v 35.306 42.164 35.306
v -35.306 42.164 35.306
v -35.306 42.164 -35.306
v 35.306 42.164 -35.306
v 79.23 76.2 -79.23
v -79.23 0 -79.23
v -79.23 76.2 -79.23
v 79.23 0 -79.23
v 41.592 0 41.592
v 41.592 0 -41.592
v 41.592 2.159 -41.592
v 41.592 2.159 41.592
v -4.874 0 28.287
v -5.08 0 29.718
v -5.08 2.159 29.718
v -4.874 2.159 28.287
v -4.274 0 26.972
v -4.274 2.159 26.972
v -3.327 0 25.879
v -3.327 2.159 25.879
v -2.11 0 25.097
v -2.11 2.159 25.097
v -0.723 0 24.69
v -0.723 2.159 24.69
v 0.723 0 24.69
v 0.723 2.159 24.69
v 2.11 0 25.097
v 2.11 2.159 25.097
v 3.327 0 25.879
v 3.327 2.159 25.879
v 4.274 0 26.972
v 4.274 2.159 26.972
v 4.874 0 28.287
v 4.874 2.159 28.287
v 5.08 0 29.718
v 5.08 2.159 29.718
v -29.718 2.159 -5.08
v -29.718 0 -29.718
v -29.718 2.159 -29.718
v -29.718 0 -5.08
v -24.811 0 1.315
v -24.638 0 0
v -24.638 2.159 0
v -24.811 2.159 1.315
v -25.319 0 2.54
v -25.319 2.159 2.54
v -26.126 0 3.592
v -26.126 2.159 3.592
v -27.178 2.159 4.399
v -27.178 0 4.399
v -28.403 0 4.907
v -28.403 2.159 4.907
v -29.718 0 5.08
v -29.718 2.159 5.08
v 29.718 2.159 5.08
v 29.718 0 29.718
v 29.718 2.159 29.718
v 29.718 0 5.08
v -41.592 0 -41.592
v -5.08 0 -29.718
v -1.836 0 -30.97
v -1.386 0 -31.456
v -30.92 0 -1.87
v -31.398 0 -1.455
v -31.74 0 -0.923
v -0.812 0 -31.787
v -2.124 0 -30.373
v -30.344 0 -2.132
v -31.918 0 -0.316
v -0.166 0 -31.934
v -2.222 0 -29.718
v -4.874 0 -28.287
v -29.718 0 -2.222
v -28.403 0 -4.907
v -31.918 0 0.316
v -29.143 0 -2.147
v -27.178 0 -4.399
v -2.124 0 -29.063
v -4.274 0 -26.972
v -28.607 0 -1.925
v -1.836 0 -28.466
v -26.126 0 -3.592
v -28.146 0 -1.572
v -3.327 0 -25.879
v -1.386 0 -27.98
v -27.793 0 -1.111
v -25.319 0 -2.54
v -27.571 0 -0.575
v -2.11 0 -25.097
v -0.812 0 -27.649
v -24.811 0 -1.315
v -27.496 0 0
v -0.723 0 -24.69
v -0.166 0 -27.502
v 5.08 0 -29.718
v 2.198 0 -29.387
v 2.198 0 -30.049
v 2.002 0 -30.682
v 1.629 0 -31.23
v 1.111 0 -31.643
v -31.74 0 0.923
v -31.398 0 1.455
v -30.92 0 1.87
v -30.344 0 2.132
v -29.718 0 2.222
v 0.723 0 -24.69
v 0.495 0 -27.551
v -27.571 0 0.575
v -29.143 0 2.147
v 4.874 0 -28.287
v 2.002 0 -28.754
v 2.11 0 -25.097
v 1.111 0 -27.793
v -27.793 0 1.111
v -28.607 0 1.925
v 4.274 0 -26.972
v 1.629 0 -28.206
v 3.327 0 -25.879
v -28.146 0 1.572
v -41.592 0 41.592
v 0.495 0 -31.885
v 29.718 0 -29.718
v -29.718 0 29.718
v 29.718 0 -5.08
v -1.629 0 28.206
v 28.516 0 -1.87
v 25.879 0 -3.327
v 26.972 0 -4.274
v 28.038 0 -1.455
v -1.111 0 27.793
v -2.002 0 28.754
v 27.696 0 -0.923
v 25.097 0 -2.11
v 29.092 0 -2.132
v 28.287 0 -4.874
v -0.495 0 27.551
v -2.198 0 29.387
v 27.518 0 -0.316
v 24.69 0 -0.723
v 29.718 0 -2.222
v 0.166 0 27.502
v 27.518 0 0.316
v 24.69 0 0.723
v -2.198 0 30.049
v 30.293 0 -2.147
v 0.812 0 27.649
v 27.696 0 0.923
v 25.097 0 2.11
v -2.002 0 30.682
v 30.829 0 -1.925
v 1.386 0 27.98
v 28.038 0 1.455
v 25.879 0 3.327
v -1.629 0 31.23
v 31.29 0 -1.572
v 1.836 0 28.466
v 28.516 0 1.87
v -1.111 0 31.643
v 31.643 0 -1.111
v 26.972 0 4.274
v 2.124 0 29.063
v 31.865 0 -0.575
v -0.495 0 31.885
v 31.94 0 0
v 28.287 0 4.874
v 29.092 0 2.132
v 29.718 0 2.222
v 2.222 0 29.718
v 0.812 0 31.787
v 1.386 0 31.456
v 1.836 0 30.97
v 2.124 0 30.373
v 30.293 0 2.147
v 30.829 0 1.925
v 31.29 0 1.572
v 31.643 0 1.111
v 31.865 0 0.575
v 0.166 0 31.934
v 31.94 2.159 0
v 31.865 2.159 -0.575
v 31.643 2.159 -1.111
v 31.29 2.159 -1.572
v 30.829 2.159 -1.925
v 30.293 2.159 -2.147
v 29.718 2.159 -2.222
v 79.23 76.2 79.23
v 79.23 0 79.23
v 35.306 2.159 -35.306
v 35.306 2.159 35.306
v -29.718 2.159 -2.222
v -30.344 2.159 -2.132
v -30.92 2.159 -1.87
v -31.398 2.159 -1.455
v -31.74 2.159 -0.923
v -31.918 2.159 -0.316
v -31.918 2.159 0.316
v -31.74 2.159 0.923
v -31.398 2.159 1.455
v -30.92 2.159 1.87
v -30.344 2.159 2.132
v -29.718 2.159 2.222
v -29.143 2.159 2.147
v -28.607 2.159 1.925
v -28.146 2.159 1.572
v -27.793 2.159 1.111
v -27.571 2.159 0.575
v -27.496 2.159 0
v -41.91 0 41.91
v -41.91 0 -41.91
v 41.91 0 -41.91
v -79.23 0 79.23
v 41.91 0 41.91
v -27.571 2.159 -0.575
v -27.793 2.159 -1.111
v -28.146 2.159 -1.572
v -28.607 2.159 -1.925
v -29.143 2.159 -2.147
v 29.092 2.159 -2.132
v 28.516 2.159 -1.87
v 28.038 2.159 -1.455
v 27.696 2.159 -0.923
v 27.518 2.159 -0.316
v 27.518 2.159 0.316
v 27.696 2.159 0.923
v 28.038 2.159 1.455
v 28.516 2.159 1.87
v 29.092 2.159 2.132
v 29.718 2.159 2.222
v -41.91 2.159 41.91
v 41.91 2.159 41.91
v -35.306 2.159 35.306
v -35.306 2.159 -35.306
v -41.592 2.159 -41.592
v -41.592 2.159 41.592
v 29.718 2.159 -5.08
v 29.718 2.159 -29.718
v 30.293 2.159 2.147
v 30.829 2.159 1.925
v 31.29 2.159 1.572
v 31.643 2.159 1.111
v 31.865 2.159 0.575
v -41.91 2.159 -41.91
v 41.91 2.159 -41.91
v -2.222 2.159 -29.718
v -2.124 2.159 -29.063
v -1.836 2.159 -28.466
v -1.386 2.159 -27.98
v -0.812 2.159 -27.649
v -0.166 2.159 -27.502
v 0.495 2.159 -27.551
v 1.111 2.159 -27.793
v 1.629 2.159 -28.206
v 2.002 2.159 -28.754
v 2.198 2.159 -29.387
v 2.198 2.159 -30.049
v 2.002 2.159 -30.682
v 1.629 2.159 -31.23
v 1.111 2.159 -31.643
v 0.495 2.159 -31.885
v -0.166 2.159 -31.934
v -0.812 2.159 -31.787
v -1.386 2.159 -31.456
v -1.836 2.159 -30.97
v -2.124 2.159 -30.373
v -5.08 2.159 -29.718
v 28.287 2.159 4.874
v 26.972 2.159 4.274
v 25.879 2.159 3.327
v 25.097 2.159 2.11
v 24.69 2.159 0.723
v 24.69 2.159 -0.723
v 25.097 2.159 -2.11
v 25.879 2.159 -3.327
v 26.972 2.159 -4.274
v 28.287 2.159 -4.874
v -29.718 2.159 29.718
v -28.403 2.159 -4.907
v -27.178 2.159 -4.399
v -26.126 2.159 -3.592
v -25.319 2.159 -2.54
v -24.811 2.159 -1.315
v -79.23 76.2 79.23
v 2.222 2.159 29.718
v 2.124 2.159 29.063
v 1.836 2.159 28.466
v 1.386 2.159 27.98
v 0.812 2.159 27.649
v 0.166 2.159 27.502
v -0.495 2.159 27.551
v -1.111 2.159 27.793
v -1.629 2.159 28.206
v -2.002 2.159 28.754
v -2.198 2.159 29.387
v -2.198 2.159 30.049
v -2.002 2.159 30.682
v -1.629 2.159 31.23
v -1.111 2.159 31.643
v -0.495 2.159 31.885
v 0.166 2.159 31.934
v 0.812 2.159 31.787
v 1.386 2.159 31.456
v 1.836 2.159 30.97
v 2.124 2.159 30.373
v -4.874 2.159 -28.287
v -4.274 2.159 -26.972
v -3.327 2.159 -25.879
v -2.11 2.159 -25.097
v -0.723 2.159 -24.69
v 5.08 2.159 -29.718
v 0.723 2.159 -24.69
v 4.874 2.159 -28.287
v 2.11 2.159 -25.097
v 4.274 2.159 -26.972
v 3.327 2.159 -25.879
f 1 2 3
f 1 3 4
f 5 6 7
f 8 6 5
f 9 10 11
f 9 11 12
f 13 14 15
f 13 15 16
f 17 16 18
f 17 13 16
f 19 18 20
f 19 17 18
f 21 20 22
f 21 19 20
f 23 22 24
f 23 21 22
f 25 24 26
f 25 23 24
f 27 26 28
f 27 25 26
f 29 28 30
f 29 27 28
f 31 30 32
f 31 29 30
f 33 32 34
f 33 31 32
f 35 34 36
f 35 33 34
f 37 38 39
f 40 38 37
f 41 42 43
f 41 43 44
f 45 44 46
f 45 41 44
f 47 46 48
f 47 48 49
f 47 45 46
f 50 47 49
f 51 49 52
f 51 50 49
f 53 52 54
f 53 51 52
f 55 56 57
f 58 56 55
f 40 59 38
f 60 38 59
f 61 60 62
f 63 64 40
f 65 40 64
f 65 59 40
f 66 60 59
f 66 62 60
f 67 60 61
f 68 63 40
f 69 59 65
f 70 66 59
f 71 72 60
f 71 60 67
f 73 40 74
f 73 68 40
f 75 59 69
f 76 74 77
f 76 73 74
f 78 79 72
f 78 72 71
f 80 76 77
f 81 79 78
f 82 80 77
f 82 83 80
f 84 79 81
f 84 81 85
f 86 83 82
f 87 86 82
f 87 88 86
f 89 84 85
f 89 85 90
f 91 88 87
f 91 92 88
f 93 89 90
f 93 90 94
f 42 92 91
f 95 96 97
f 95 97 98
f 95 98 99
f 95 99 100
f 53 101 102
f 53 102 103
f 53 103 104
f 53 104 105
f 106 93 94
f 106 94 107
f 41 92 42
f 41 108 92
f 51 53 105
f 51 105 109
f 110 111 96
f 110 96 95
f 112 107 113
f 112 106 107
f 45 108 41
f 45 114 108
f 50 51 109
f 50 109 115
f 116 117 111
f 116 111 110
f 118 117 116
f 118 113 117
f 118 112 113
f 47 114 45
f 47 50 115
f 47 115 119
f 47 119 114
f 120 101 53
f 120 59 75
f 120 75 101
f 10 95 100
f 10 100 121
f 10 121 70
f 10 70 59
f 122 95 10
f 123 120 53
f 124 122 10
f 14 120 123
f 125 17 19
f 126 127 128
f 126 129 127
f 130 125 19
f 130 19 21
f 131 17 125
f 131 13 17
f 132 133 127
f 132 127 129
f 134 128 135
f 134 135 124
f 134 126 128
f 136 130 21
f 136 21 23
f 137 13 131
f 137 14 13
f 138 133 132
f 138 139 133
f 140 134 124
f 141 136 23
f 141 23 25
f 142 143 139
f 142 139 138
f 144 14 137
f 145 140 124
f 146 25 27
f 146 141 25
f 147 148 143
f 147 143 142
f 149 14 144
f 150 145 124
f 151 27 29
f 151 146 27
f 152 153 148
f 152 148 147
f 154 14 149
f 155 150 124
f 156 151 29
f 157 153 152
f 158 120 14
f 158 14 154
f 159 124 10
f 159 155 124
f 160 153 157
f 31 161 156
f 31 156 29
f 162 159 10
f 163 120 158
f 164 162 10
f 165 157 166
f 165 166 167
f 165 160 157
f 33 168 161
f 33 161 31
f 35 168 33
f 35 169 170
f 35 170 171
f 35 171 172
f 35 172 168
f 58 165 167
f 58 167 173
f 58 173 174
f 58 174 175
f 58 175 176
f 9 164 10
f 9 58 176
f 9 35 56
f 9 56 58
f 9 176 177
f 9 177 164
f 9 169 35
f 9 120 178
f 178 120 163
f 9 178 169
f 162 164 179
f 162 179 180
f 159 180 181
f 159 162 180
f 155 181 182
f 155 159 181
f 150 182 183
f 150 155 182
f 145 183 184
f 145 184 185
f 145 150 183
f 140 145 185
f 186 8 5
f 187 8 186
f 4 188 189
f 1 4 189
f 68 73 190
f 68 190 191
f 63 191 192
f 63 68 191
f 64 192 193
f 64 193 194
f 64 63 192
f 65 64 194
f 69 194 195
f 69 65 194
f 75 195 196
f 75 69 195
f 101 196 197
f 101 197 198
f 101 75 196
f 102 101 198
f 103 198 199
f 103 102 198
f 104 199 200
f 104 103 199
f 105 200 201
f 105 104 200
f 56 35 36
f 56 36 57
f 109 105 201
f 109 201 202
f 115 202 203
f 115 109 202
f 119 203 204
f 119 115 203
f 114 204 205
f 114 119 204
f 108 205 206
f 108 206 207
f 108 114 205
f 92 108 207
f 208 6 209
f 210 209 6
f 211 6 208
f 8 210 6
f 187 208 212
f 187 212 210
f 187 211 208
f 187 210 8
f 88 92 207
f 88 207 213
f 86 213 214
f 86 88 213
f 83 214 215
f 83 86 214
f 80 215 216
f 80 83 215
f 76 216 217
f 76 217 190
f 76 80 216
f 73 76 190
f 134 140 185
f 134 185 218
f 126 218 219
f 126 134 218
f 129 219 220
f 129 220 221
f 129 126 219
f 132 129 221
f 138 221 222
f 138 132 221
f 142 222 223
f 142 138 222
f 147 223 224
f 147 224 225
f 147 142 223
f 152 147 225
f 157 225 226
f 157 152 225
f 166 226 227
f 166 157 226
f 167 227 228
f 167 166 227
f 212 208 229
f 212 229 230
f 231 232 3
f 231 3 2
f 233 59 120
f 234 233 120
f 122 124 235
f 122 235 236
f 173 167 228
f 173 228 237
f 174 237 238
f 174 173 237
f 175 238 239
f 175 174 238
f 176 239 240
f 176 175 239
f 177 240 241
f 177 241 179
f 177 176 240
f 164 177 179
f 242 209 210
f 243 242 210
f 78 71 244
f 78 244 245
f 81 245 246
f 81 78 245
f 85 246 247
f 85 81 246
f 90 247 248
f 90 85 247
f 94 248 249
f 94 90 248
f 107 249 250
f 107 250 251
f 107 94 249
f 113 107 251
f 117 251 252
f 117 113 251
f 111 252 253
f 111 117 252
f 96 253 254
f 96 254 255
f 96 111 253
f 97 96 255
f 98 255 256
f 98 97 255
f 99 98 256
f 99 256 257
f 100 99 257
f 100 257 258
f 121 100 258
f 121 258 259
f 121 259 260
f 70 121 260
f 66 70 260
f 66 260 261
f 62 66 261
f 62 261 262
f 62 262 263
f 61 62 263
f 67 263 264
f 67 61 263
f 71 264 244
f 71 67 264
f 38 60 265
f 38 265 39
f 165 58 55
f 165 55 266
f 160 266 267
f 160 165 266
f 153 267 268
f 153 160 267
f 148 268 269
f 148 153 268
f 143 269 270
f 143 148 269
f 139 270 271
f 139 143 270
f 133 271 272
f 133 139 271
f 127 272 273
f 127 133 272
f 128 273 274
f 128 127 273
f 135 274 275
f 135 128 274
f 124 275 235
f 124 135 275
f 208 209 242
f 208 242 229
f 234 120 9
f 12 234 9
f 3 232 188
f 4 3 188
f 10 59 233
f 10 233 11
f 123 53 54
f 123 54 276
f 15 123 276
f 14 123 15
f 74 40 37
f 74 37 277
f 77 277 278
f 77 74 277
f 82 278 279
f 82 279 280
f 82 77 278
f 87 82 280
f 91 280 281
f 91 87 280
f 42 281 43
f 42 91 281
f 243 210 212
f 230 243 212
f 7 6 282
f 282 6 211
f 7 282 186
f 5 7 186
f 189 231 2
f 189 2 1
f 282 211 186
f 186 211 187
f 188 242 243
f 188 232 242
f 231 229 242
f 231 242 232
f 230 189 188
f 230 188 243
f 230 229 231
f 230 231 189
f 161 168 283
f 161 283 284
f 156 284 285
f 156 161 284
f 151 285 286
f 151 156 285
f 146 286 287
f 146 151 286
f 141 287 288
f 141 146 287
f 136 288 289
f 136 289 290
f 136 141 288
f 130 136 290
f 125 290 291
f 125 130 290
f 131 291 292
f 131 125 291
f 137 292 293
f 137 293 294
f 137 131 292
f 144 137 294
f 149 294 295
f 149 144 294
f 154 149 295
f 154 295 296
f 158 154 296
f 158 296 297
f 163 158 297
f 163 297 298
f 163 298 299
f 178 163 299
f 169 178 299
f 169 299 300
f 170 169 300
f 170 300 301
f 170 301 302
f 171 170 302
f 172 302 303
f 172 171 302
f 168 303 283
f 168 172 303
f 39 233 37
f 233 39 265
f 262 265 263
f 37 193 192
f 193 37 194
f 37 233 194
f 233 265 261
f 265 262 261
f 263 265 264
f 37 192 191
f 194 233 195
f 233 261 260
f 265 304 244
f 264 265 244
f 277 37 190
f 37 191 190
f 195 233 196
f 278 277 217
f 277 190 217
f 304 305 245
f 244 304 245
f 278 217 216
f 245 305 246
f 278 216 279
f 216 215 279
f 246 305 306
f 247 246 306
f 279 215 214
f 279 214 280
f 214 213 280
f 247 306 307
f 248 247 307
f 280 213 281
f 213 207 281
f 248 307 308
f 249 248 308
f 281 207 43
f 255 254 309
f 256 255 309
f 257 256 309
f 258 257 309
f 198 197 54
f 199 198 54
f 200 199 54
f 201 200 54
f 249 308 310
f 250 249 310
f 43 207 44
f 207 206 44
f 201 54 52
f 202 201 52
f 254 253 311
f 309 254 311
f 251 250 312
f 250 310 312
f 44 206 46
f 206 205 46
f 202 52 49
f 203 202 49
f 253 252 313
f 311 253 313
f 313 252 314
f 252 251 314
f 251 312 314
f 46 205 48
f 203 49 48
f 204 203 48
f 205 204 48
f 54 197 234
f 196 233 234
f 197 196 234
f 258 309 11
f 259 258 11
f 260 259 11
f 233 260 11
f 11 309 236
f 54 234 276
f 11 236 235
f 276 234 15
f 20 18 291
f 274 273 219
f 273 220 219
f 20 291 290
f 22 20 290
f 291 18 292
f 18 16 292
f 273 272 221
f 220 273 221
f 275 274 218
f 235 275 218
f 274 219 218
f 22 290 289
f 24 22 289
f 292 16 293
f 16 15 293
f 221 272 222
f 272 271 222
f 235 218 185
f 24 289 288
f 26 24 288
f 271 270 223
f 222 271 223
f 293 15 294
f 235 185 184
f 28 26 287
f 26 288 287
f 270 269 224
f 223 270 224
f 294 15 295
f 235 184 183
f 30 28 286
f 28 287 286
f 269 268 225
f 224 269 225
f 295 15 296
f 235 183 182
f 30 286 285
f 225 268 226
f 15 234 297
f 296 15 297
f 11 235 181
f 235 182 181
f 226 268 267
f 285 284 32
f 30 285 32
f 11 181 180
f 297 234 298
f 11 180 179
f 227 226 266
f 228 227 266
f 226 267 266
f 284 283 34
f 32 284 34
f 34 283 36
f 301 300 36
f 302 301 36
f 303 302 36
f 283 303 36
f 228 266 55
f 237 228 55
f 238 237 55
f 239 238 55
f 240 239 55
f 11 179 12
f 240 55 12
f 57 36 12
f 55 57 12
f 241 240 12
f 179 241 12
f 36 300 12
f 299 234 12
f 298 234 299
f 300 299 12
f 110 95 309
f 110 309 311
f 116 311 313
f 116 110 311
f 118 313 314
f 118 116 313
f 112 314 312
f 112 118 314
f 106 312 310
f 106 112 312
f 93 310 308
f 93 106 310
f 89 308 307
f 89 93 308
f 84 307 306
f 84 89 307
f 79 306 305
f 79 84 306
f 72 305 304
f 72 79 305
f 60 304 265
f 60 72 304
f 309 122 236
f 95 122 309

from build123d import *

# Parameters (mm, degrees)
F1_W     = 83.185
F1_H     = 83.185
F1_W_2   = 70.612
F1_H_2   = 70.612
F2_DEPTH = 2.159
F0_W     = 158.4607362747
F0_H     = 158.4607362747
F0_W_2   = 83.82
F0_H_2   = 83.82
F0_W_3   = 70.612
F0_H_3   = 70.612
F3_DEPTH = 76.2
F4_DEPTH = 2.159
F5_DEPTH = 42.164


with BuildPart() as f2:
    # F1 (on face) → F2 (new body)
    with BuildSketch(Plane.XZ):
        Rectangle(F1_W, F1_H)
        Rectangle(F1_W_2, F1_H_2, mode=Mode.SUBTRACT)
        Rectangle(F1_W_2, F1_H_2)
        with BuildLine():
            Line((5.08, 29.718), (29.718, 29.718))
            Line((29.718, 29.718), (29.718, 5.08))
            ThreePointArc((29.718, 5.08), (33.3101024484, 3.5921024484), (34.798, 0))
            ThreePointArc((34.798, 0), (33.3101024484, -3.5921024484), (29.718, -5.08))
            Line((29.718, -5.08), (29.718, -29.718))
            Line((29.718, -29.718), (5.08, -29.718))
            ThreePointArc((5.08, -29.718), (0, -34.798), (-5.08, -29.718))
            Line((-5.08, -29.718), (-29.718, -29.718))
            Line((-29.718, -29.718), (-29.718, -5.08))
            ThreePointArc((-29.718, -5.08), (-34.798, 0), (-29.718, 5.08))
            Line((-29.718, 5.08), (-29.718, 29.718))
            Line((-29.718, 29.718), (-5.08, 29.718))
            ThreePointArc((-5.08, 29.718), (0, 34.798), (5.08, 29.718))
        make_face(mode=Mode.SUBTRACT)
        with BuildLine():
            Line((-29.718, 2.2225), (-29.718, 5.08))
            ThreePointArc((-29.718, 5.08), (-34.798, 0), (-29.718, -5.08))
            Line((-29.718, -5.08), (-29.718, -2.2225))
            ThreePointArc((-29.718, -2.2225), (-31.9405, 0), (-29.718, 2.2225))
        make_face()
        with BuildLine():
            ThreePointArc((-24.638, 0), (-26.1258975516, 3.5921024484), (-29.718, 5.08))
            Line((-29.718, 5.08), (-29.718, 2.2225))
            ThreePointArc((-29.718, 2.2225), (-28.1464551788, 1.5715448212), (-27.4955, 0))
            ThreePointArc((-27.4955, 0), (-28.1464551788, -1.5715448212), (-29.718, -2.2225))
            Line((-29.718, -2.2225), (-29.718, -5.08))
            ThreePointArc((-29.718, -5.08), (-26.1258975516, -3.5921024484), (-24.638, 0))
        make_face()
        with BuildLine():
            ThreePointArc((-5.08, 29.718), (0, 24.638), (5.08, 29.718))
            Line((5.08, 29.718), (2.2225, 29.718))
            ThreePointArc((2.2225, 29.718), (0, 27.4955), (-2.2225, 29.718))
            Line((-2.2225, 29.718), (-5.08, 29.718))
        make_face()
        with BuildLine():
            Line((2.2225, 29.718), (5.08, 29.718))
            ThreePointArc((5.08, 29.718), (0, 34.798), (-5.08, 29.718))
            Line((-5.08, 29.718), (-2.2225, 29.718))
            ThreePointArc((-2.2225, 29.718), (0, 31.9405), (2.2225, 29.718))
        make_face()
        with BuildLine():
            Line((29.718, 2.2225), (29.718, 5.08))
            ThreePointArc((29.718, 5.08), (24.638, 0), (29.718, -5.08))
            Line((29.718, -5.08), (29.718, -2.2225))
            ThreePointArc((29.718, -2.2225), (27.4955, 0), (29.718, 2.2225))
        make_face()
        with BuildLine():
            ThreePointArc((34.798, 0), (33.3101024484, 3.5921024484), (29.718, 5.08))
            Line((29.718, 5.08), (29.718, 2.2225))
            ThreePointArc((29.718, 2.2225), (31.2895448212, 1.5715448212), (31.9405, 0))
            ThreePointArc((31.9405, 0), (31.2895448212, -1.5715448212), (29.718, -2.2225))
            Line((29.718, -2.2225), (29.718, -5.08))
            ThreePointArc((29.718, -5.08), (33.3101024484, -3.5921024484), (34.798, 0))
        make_face()
        with BuildLine():
            ThreePointArc((-5.08, -29.718), (0, -34.798), (5.08, -29.718))
            Line((5.08, -29.718), (2.2225, -29.718))
            ThreePointArc((2.2225, -29.718), (0, -31.9405), (-2.2225, -29.718))
            Line((-2.2225, -29.718), (-5.08, -29.718))
        make_face()
        with BuildLine():
            Line((2.2225, -29.718), (5.08, -29.718))
            ThreePointArc((5.08, -29.718), (0, -24.638), (-5.08, -29.718))
            Line((-5.08, -29.718), (-2.2225, -29.718))
            ThreePointArc((-2.2225, -29.718), (0, -27.4955), (2.2225, -29.718))
        make_face()
    extrude(amount=-F2_DEPTH)


with BuildPart() as f3:
    # F0 (on Front) → F3 (new body)
    with BuildSketch(Plane.XZ):
        Rectangle(F0_W, F0_H)
        Rectangle(F0_W_2, F0_H_2, mode=Mode.SUBTRACT)
        Rectangle(F0_W_2, F0_H_2)
        Rectangle(F0_W_3, F0_H_3, mode=Mode.SUBTRACT)
        Rectangle(F0_W_3, F0_H_3)
    extrude(amount=-F3_DEPTH)

    # F0 (on Front) → F4 (cut)
    with BuildSketch(Plane.XZ):
        Rectangle(F0_W_2, F0_H_2)
        Rectangle(F0_W_3, F0_H_3, mode=Mode.SUBTRACT)
        Rectangle(F0_W_3, F0_H_3)
    extrude(amount=-F4_DEPTH, mode=Mode.SUBTRACT)

    # F0 (on Front) → F5 (cut)
    with BuildSketch(Plane.XZ):
        Rectangle(F0_W_3, F0_H_3)
    extrude(amount=-F5_DEPTH, mode=Mode.SUBTRACT)


solid = Compound([f2.part, f3.part])
